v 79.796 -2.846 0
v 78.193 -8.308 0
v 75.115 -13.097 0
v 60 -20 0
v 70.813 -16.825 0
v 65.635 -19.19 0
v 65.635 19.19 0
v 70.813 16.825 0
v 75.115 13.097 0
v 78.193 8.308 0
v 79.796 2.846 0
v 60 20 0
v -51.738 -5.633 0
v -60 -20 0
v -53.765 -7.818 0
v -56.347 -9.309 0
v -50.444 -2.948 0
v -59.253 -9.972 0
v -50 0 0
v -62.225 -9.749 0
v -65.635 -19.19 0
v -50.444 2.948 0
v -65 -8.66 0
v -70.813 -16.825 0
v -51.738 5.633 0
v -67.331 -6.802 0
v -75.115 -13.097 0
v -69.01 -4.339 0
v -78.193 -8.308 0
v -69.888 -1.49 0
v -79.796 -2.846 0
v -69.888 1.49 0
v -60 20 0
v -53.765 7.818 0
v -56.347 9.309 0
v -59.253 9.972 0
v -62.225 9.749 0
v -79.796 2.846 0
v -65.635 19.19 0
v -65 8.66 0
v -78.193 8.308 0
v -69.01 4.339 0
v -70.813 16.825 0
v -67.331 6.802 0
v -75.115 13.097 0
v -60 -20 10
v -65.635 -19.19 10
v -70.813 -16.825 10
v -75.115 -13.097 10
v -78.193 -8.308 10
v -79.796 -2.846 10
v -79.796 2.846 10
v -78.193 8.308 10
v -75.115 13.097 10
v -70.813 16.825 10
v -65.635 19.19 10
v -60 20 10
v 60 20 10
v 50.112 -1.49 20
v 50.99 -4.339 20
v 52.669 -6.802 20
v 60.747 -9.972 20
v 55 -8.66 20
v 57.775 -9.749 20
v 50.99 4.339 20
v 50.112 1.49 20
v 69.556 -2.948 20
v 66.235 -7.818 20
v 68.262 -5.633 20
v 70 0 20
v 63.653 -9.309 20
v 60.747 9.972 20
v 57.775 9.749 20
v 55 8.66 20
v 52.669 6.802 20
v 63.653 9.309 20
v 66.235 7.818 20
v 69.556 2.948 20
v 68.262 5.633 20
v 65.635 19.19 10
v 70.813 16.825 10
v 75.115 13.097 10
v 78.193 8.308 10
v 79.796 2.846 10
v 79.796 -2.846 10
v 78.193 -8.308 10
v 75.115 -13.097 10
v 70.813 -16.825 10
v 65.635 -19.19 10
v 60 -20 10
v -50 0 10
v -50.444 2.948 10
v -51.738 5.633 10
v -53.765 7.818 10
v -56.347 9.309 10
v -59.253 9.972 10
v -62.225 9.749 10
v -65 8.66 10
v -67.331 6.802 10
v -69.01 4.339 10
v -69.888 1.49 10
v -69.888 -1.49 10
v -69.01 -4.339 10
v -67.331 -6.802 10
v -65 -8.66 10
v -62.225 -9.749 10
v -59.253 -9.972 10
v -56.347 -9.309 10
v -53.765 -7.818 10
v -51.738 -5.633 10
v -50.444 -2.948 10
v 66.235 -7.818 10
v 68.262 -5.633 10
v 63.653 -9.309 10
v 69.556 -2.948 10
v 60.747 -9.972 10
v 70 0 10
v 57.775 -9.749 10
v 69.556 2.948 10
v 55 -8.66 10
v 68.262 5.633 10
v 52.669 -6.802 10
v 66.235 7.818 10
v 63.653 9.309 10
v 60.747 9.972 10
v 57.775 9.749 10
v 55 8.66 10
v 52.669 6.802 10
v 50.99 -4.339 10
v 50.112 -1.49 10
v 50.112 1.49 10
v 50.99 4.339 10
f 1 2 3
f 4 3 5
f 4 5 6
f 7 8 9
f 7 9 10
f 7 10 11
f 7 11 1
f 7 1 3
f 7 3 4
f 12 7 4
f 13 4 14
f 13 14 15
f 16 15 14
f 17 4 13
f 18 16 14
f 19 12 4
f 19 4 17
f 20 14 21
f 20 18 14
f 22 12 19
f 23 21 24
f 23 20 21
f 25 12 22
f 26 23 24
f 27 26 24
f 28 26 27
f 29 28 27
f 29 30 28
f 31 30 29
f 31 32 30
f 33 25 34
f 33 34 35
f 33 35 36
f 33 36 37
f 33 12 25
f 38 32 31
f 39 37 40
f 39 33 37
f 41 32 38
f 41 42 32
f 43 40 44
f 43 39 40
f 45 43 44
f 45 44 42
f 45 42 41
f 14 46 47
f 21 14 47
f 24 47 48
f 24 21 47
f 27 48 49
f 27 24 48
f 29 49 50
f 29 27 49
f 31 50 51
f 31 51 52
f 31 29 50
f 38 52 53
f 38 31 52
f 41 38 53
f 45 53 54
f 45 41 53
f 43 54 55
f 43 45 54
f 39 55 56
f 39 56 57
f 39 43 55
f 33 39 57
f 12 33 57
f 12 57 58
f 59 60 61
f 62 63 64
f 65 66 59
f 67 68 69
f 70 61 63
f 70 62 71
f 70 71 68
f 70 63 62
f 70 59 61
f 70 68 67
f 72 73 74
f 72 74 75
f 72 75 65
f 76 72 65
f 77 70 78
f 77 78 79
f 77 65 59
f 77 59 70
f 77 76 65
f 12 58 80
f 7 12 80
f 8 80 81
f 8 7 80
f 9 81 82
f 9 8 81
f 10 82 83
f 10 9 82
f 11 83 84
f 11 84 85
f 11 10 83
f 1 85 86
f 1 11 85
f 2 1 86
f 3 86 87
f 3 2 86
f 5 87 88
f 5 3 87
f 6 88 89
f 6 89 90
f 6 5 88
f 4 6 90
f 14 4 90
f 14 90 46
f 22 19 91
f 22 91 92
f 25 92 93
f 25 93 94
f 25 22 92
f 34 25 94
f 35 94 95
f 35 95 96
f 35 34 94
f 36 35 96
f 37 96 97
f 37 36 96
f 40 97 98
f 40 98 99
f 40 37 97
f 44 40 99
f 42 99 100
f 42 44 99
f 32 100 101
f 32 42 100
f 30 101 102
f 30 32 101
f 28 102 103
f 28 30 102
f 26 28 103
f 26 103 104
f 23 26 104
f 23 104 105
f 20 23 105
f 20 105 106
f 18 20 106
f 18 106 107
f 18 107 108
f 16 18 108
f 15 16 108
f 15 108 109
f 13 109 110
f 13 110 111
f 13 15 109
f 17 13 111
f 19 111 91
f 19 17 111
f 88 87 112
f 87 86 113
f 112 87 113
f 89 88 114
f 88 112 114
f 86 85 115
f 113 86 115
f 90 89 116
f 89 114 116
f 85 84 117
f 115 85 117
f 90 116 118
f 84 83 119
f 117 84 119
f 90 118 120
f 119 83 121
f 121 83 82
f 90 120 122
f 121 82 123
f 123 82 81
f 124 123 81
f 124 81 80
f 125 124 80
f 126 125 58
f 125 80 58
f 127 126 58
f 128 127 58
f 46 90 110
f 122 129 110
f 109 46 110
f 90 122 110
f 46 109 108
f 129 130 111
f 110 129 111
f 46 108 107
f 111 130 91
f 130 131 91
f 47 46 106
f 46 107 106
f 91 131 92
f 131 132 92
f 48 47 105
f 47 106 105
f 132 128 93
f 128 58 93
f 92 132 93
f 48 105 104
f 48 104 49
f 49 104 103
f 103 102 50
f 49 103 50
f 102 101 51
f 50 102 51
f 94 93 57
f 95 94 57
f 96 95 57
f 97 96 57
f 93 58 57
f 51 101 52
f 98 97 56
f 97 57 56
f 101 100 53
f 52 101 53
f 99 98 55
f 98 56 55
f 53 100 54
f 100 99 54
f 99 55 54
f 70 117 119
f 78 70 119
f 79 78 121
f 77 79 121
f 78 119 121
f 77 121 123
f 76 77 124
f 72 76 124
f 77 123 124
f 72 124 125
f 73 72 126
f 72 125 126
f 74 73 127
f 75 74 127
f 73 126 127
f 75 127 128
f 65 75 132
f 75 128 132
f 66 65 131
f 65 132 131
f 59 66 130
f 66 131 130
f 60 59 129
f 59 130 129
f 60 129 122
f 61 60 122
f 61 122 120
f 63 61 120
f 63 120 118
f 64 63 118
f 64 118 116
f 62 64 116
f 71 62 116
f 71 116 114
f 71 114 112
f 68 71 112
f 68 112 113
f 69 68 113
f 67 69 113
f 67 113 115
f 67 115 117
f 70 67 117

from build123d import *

# Parameters (mm, degrees)
SKETCH1_R           = 10
BOSS_EXTRUDE1_DEPTH = 10
SKETCH1_2_R         = 10
BOSS_EXTRUDE2_DEPTH = 20


with BuildPart() as part:
    # Sketch1 → Boss-Extrude1 (new body)
    with BuildSketch(Plane.XY):
        with BuildLine():
            Line((-60, 20), (60, 20))
            ThreePointArc((60, 20), (80, 0), (60, -20))
            Line((60, -20), (-60, -20))
            ThreePointArc((-60, -20), (-80, 0), (-60, 20))
        make_face()
        with Locations((-60, 0)):
            Circle(SKETCH1_R, mode=Mode.SUBTRACT)
        with Locations((60, 0)):
            Circle(SKETCH1_R, mode=Mode.SUBTRACT)
    extrude(amount=BOSS_EXTRUDE1_DEPTH)

    # Sketch1<2> → Boss-Extrude2 (add)
    with BuildSketch(Plane.XY):
        with Locations((60, 0)):
            Circle(SKETCH1_2_R)
    extrude(amount=BOSS_EXTRUDE2_DEPTH)


solid = part.part
